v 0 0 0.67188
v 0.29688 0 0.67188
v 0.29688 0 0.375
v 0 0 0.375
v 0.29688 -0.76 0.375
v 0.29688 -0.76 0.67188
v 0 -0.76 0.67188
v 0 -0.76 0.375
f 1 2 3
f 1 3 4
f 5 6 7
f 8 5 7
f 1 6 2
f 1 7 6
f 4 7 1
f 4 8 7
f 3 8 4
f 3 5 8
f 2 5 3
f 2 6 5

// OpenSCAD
EPS = 0.01;

translate([0, 0, 0.375])
rotate([90, 0, 0])
linear_extrude(height=0.75 + EPS)
    polygon(points=[[0.296875, 0.0], [0.296875, 0.296875], [0.0, 0.296875], [0.0, 0.0]]);
